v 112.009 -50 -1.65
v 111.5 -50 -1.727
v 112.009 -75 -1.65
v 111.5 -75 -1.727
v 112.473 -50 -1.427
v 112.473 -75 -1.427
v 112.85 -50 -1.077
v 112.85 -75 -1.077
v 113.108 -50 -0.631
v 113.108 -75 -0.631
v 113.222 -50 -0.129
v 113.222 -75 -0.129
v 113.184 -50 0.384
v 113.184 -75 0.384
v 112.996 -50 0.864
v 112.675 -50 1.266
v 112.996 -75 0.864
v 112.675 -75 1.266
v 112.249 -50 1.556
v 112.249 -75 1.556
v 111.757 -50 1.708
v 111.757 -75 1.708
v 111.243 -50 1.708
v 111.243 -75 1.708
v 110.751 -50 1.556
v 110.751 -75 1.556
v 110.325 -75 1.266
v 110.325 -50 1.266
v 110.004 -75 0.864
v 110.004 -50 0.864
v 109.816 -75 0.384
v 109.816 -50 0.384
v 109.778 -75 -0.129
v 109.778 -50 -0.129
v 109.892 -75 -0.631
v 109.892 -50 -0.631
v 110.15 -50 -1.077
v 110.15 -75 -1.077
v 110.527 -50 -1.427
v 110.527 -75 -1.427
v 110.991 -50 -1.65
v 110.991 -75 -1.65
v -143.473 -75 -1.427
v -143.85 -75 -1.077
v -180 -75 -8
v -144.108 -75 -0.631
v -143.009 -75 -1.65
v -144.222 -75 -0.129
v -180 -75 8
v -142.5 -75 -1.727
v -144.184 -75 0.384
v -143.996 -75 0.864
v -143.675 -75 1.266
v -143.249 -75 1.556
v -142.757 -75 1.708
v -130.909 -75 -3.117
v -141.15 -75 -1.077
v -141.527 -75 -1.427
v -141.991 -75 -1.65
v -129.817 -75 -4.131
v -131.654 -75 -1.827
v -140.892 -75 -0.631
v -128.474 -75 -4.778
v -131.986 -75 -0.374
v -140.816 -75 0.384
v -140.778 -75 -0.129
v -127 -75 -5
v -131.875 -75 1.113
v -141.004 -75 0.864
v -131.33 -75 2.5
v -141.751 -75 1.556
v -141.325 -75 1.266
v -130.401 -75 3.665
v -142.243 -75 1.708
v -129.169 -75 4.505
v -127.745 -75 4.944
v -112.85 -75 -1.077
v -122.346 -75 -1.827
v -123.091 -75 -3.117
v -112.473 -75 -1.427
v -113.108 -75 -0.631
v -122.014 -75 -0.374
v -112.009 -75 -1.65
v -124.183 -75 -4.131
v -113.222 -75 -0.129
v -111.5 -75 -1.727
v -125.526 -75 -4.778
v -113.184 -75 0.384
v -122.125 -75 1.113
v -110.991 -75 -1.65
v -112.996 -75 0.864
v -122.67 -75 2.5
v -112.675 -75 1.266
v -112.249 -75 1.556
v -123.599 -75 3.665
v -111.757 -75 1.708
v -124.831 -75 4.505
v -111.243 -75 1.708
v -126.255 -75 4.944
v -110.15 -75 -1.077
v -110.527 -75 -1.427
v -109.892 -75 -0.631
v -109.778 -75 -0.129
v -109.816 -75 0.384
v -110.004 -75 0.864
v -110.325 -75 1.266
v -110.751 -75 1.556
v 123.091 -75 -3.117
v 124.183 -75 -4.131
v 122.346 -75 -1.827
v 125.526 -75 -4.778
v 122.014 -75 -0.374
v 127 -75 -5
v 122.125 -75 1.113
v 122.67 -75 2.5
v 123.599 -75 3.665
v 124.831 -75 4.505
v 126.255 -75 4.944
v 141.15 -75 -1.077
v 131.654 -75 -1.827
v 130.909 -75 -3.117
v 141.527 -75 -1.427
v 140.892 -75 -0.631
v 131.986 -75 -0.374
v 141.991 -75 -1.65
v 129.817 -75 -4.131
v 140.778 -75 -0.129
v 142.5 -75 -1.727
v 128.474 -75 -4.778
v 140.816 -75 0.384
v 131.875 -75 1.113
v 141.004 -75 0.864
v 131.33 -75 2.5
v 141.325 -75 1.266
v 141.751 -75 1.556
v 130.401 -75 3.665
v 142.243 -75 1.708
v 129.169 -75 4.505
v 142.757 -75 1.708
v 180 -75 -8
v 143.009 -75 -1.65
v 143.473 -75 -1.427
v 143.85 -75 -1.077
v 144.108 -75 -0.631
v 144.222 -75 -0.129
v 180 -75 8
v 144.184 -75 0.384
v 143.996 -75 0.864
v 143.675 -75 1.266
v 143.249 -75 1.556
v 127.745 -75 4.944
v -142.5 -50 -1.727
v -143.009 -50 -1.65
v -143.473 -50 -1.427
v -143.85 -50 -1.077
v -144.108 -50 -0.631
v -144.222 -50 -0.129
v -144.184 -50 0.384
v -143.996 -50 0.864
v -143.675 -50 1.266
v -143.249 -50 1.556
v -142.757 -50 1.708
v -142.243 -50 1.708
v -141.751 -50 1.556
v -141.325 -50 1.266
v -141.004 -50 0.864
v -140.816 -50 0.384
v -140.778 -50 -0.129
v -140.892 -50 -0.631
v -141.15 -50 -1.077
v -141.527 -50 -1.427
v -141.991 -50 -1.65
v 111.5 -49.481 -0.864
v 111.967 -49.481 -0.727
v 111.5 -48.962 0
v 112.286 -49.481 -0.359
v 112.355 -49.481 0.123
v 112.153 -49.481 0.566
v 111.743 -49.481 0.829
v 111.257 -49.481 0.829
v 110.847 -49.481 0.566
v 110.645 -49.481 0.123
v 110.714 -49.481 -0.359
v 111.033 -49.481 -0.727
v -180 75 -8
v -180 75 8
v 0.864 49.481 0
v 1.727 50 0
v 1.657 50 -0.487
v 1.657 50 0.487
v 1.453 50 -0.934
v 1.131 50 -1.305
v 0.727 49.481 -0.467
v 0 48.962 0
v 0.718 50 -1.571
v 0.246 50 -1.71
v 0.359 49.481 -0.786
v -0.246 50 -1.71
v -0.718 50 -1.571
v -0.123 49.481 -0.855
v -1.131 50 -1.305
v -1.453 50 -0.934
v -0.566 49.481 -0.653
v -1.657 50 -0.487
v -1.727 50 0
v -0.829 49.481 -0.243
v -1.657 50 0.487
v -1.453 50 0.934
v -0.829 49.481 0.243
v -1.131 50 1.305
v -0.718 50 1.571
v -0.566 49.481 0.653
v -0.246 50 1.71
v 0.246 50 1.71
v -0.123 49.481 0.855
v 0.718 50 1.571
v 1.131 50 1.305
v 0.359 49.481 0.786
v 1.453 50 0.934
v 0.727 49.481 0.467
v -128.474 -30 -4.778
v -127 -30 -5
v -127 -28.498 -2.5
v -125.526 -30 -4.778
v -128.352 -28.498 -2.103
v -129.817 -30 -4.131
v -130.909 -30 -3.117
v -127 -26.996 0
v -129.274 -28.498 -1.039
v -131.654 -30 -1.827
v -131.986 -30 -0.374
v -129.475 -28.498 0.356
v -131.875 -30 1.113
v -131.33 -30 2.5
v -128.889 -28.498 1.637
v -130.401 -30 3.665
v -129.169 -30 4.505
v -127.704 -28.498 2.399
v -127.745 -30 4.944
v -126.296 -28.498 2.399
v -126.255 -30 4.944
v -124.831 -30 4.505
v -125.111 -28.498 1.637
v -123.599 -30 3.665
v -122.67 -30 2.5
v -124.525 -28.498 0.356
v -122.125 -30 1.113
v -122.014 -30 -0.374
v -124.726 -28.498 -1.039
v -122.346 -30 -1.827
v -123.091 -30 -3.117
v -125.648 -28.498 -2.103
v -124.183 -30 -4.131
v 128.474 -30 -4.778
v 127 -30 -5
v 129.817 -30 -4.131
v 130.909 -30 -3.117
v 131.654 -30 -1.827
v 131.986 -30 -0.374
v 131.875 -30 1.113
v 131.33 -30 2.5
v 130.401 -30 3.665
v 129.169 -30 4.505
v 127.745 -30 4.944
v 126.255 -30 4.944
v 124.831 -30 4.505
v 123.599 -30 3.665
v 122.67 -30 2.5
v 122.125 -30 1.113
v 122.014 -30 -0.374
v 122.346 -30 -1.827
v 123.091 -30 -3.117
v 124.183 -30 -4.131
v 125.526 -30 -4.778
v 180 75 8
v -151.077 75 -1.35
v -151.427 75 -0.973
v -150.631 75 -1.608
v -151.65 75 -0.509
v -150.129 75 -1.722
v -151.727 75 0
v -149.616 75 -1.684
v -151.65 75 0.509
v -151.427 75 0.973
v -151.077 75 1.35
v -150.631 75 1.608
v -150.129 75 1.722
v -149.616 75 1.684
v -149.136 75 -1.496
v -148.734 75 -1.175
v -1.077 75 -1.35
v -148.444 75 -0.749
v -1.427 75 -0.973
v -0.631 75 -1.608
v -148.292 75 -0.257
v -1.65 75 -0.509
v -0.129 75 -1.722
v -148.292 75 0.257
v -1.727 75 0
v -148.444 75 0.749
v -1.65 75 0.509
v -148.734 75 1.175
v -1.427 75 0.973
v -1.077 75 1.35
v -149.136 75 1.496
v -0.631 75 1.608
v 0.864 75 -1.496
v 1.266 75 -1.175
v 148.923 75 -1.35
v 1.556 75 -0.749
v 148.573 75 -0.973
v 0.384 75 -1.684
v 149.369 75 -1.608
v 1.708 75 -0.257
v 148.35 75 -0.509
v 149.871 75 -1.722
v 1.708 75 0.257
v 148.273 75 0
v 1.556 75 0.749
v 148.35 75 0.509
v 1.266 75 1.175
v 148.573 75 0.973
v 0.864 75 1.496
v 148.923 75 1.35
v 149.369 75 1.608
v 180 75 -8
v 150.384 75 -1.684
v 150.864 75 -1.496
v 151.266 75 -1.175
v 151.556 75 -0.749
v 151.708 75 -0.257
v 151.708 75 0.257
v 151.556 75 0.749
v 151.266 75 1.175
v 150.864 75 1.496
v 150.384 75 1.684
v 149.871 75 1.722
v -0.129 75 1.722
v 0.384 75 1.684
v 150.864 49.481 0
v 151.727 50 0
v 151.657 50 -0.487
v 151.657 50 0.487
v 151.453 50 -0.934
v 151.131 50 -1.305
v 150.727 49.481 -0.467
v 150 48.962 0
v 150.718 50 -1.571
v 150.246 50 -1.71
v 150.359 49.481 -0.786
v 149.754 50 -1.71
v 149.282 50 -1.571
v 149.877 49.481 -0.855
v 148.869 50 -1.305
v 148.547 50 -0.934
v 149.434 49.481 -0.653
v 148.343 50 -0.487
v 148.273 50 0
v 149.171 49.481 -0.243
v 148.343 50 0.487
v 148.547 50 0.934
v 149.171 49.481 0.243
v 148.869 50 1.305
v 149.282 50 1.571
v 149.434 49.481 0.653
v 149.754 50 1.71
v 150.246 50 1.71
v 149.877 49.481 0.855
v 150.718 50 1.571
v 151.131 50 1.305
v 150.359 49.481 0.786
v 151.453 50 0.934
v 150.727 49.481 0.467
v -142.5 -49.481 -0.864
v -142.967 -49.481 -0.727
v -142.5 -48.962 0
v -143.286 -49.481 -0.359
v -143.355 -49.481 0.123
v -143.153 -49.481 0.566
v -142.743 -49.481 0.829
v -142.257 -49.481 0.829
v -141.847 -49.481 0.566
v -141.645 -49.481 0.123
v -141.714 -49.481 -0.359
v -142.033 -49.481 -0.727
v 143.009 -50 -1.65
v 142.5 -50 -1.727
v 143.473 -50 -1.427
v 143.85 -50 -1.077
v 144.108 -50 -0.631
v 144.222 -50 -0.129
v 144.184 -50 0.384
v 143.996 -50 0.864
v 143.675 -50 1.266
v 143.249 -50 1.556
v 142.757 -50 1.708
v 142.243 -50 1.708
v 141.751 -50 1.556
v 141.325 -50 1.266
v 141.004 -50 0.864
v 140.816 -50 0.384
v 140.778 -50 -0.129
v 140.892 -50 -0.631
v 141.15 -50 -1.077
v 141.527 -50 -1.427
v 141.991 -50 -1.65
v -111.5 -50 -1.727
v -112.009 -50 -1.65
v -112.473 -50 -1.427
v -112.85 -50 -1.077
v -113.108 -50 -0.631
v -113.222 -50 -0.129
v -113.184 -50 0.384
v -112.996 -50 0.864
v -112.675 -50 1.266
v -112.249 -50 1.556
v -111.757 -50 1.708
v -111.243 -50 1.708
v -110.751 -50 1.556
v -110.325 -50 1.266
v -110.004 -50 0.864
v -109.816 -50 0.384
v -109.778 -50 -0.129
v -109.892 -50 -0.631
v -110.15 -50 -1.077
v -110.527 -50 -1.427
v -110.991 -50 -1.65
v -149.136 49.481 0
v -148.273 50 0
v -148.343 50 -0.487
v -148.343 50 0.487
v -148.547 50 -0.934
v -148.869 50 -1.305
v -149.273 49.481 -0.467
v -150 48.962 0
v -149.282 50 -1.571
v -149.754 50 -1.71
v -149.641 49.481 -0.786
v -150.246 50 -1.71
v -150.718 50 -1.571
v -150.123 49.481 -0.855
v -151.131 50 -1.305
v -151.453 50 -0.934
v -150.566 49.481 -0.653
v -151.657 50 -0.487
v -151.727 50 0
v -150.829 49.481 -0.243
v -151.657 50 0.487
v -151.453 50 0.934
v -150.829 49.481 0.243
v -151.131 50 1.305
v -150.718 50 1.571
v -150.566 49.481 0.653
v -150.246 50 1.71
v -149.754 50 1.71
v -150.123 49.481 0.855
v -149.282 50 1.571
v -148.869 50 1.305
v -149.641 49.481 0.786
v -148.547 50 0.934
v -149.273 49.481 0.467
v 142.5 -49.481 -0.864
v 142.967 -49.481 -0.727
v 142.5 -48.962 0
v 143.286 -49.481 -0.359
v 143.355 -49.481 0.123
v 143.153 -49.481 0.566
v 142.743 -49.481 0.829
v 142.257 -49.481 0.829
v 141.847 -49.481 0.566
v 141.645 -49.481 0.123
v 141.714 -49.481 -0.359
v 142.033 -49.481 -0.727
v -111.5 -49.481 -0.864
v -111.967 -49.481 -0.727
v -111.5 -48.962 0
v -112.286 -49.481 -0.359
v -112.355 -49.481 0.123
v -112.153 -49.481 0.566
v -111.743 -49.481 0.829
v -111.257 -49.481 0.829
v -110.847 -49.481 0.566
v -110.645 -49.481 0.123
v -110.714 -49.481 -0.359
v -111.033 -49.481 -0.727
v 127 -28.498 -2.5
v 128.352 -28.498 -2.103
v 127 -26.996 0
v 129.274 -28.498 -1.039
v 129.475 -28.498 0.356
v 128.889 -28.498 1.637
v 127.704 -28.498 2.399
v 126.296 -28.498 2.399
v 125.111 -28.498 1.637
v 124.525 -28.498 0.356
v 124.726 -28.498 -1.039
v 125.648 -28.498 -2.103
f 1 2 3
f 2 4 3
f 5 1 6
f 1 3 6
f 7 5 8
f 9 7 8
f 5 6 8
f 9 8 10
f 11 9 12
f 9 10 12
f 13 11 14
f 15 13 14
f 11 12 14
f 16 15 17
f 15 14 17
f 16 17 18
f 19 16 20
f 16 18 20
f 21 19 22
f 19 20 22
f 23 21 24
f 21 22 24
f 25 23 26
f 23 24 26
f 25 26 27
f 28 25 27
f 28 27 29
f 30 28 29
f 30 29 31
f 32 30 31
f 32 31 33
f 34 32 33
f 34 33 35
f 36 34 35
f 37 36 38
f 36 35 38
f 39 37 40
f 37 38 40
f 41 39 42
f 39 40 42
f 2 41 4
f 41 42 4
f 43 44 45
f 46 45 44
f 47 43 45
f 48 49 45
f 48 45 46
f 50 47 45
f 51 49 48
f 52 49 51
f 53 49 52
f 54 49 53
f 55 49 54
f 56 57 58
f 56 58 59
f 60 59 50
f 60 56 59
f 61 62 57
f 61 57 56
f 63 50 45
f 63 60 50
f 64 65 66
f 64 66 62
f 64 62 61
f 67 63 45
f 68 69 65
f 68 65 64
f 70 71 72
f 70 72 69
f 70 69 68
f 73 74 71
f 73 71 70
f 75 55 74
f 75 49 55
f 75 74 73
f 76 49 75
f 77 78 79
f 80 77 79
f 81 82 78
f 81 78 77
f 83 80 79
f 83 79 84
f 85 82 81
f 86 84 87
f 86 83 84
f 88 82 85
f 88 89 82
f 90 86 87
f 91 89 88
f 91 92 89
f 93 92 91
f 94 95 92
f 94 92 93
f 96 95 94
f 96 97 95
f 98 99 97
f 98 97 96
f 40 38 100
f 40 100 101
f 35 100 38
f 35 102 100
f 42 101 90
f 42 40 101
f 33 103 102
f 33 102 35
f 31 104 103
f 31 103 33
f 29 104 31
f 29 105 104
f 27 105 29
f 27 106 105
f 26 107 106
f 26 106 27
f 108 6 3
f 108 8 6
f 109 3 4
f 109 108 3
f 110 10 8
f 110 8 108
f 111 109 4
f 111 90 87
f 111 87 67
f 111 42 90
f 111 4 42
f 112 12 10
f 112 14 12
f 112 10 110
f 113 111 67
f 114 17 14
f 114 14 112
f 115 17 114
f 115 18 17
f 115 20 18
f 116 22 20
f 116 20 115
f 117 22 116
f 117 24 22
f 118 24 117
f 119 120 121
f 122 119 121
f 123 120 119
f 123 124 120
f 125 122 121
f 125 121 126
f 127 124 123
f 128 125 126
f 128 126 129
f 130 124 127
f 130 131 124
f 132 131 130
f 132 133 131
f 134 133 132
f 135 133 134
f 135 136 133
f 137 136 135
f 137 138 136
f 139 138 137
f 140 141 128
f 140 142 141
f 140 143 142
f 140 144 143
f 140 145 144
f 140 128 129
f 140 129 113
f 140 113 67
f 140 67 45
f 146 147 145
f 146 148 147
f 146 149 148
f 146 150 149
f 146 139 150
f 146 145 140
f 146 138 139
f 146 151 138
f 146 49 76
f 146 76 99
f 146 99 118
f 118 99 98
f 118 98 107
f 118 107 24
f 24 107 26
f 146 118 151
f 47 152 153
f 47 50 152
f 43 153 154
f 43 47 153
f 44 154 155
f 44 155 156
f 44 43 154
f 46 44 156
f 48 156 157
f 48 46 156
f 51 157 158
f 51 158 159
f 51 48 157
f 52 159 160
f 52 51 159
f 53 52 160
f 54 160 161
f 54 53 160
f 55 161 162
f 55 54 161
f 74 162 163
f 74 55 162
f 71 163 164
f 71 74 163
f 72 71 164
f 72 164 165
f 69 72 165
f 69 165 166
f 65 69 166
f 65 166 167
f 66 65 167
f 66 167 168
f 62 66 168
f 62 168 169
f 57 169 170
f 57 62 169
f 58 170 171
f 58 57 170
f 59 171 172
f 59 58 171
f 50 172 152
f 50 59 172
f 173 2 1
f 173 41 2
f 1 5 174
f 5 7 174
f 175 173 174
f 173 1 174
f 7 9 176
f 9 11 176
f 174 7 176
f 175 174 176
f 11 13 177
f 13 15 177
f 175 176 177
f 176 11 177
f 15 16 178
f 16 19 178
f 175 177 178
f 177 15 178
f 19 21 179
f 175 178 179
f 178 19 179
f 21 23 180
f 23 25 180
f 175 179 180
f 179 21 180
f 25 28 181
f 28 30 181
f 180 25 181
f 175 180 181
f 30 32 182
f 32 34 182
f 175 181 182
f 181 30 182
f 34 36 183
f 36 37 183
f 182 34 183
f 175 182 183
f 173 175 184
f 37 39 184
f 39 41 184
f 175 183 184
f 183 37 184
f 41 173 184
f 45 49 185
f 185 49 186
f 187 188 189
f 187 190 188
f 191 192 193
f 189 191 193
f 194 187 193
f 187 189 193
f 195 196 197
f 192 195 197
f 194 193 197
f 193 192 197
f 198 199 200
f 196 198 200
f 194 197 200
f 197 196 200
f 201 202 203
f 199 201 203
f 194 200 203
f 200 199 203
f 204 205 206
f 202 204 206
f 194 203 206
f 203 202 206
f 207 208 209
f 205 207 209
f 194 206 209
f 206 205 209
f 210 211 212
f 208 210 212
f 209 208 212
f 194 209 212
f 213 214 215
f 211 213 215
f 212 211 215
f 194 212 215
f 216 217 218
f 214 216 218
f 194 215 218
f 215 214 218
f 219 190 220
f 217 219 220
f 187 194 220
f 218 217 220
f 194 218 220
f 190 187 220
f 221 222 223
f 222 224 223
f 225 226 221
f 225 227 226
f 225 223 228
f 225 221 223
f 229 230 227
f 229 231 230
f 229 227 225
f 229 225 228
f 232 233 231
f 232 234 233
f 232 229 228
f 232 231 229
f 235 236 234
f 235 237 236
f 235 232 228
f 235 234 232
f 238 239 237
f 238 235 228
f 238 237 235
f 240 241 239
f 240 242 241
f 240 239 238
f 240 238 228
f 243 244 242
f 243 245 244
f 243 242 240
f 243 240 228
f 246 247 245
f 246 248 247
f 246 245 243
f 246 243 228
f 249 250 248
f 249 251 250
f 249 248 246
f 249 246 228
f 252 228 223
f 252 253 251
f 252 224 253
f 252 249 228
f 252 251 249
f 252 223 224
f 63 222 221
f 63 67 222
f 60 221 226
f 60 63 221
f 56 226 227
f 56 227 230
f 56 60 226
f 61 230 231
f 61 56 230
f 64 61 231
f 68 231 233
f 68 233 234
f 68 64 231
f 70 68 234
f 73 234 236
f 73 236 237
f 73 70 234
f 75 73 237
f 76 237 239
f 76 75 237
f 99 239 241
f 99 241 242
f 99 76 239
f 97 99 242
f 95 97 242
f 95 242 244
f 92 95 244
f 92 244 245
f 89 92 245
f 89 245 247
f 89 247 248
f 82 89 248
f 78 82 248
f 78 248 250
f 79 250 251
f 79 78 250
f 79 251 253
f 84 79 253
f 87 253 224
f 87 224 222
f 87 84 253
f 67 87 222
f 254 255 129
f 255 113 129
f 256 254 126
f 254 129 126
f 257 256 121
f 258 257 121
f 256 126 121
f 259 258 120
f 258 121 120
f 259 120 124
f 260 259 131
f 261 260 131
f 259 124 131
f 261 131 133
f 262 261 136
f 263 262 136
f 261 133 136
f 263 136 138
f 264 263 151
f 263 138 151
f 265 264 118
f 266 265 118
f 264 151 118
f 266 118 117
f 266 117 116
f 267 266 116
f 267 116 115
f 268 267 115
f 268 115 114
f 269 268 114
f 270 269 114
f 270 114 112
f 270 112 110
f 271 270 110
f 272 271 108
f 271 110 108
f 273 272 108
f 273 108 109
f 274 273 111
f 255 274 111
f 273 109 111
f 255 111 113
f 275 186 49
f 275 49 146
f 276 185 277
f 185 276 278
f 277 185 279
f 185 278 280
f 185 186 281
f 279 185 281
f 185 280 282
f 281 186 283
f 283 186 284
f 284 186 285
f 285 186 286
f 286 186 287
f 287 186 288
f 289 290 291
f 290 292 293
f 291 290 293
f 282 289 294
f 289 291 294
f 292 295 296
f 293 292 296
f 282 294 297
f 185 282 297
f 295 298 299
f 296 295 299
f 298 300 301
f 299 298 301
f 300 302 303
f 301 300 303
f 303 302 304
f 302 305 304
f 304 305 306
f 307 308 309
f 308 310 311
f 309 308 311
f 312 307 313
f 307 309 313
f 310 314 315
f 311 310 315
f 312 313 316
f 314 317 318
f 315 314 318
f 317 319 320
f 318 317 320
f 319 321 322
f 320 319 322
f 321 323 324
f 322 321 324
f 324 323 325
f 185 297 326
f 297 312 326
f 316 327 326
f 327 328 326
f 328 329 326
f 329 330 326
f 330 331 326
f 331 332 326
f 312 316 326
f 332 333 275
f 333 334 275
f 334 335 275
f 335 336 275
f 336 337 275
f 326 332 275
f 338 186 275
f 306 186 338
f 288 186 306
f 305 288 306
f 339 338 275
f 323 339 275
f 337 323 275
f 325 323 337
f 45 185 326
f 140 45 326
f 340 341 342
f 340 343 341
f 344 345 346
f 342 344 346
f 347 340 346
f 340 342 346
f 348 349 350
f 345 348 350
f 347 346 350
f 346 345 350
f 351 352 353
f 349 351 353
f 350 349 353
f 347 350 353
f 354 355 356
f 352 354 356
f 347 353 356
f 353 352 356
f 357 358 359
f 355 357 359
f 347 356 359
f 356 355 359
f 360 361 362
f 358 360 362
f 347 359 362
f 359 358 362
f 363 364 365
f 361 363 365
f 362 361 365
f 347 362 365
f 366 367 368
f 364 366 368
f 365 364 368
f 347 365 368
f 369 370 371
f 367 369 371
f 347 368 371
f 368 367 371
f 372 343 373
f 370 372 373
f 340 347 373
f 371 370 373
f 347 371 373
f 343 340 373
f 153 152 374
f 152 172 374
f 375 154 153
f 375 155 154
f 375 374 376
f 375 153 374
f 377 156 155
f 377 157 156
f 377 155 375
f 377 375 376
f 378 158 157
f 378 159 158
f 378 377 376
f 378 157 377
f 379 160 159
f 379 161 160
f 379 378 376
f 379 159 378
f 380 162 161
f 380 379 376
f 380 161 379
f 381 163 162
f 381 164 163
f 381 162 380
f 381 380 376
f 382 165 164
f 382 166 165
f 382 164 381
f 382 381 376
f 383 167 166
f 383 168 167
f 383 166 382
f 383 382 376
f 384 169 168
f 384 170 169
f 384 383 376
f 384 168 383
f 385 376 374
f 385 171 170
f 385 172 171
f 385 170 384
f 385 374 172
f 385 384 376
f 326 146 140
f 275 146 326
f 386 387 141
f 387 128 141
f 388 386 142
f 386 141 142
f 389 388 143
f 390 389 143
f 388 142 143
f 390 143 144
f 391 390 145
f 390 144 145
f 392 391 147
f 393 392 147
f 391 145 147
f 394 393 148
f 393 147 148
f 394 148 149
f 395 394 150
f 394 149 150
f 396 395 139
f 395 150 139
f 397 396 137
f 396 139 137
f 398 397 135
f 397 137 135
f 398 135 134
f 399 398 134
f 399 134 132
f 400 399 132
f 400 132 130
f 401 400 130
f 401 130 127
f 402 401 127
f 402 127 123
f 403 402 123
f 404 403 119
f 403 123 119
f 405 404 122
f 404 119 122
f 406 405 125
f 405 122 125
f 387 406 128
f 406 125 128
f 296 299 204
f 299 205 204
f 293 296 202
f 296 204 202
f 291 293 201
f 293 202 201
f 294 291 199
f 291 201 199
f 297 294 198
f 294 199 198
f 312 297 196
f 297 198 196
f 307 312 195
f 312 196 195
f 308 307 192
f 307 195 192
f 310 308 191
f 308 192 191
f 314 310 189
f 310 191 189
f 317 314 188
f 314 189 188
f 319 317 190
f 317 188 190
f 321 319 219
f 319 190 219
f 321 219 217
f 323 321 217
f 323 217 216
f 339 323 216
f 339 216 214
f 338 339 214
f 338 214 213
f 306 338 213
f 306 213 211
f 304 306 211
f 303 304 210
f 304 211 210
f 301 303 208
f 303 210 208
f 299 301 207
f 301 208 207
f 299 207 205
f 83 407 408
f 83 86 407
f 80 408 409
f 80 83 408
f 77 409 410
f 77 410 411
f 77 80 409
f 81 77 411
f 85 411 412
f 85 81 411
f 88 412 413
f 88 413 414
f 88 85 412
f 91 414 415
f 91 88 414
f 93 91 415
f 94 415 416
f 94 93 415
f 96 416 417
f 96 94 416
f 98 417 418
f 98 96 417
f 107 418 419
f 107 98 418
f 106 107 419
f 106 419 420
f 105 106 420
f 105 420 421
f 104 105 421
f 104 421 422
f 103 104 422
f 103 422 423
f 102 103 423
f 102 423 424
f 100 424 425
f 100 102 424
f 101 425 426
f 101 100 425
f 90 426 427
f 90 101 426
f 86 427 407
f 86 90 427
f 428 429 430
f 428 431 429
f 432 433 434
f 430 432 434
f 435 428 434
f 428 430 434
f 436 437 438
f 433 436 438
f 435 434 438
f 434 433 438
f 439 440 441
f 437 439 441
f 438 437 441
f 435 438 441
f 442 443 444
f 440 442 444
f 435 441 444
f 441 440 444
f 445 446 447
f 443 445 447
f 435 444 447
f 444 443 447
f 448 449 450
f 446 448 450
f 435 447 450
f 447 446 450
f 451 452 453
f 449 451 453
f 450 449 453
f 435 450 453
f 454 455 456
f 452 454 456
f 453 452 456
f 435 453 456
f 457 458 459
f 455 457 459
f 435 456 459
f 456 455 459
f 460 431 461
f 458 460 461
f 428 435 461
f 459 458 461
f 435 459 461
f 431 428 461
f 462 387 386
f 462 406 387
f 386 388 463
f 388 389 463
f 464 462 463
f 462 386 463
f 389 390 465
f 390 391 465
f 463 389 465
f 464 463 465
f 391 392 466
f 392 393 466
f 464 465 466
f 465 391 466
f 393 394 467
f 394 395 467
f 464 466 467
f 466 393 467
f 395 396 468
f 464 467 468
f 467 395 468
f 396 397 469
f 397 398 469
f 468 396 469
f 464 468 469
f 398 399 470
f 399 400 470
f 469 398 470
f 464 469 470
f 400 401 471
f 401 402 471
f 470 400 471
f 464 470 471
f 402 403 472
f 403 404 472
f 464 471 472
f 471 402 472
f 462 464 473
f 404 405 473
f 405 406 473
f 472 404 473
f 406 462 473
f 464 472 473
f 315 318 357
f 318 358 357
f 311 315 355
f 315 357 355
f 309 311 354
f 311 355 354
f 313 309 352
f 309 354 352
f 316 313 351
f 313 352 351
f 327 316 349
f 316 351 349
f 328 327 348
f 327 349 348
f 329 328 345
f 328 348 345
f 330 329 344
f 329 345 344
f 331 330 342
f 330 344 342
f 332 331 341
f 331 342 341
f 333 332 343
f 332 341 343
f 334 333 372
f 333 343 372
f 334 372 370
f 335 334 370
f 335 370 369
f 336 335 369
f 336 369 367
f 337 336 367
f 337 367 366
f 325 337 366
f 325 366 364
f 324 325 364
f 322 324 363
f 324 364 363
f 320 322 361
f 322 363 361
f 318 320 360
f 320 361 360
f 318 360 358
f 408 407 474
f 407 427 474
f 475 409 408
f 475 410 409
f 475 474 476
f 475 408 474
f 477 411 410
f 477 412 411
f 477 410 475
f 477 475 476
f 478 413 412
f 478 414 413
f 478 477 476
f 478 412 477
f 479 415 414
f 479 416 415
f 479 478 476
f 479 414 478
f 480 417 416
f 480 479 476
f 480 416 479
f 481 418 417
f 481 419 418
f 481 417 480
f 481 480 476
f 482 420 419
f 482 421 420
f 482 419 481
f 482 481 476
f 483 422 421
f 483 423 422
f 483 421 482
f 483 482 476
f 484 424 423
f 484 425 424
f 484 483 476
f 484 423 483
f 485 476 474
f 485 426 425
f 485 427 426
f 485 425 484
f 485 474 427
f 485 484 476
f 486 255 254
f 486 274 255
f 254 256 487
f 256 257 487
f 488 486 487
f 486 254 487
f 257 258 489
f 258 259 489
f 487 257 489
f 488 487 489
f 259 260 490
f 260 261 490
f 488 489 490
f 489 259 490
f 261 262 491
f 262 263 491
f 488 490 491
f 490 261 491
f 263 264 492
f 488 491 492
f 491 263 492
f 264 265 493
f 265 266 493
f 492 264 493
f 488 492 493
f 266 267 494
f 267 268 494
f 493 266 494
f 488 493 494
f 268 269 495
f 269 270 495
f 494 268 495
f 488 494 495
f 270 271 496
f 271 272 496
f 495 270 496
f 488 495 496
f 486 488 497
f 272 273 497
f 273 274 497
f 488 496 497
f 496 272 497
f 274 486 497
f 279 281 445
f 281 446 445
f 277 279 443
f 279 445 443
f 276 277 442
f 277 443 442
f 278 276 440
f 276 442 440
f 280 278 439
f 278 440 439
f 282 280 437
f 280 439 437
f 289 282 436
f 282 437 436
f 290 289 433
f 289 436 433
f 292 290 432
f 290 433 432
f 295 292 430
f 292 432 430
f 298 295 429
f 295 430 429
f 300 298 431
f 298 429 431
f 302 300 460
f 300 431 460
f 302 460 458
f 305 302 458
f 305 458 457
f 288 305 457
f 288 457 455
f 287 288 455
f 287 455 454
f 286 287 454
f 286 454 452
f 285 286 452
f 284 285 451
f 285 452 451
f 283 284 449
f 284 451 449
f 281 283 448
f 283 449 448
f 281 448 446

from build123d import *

# Parameters (mm, degrees)
SKETCH1_W                      = 360
SKETCH1_H                      = 150
BOSS_EXTRUDE1_DEPTH            = 8
F_8_36_TAPPED_HOLE1_AT_2_COUNT = 2
F_8_36_TAPPED_HOLE1_AT_2_PITCH = 31
F_8_36_TAPPED_HOLE2_D          = 3.4544
F_8_36_TAPPED_HOLE2_DEPTH      = 25
F_8_36_TAPPED_HOLE2_TIP        = 1.037806461


with BuildPart() as part:
    # Sketch1 → Boss-Extrude1 (new, symmetric)
    with BuildSketch(Plane.XY):
        Rectangle(SKETCH1_W, SKETCH1_H)
    extrude(amount=BOSS_EXTRUDE1_DEPTH, both=True)

    # Sketch3 → #8-36 Tapped Hole1 (revolve, cut)
    with BuildSketch(Plane(origin=(-142.5, -75, 0), x_dir=(0, 0, -1), z_dir=(1, 0, 0))):
        Polygon((0, 0), (0, 26.037806461), (1.7272, 25), (1.7272, 0), align=None)
    f_8_36_tapped_hole1 = revolve(axis=Axis((-142.5, -81.35, 0), (0, 1, 0)), mode=Mode.SUBTRACT)

    # #8-36 Tapped Hole1 at 2: #8-36 Tapped Hole1 ×2
    with Locations(*[(i * F_8_36_TAPPED_HOLE1_AT_2_PITCH, 0, 0) for i in range(1, F_8_36_TAPPED_HOLE1_AT_2_COUNT)]):
        add(f_8_36_tapped_hole1, mode=Mode.SUBTRACT)

    # Sketch6 → M8 Clearance Hole1 (revolve, cut)
    with BuildSketch(Plane(origin=(-127, -75, 0), x_dir=(0, 0, -1), z_dir=(1, 0, 0))):
        Polygon((0, 0), (0, 48.004303095), (5, 45), (5, 0), align=None)
    m8_clearance_hole1 = revolve(axis=Axis((-127, -81.35, 0), (0, 1, 0)), mode=Mode.SUBTRACT)

    # Mirror1: #8-36 Tapped Hole1, M8 Clearance Hole1 across plane
    add(f_8_36_tapped_hole1.mirror(Plane(origin=(0, 0, 0), x_dir=(0, 0, 1), z_dir=(1, 0, 0))), mode=Mode.SUBTRACT)
    add(m8_clearance_hole1.mirror(Plane(origin=(0, 0, 0), x_dir=(0, 0, 1), z_dir=(1, 0, 0))), mode=Mode.SUBTRACT)

    # Mirror1 copy 1 sketch → Mirror1 copy 1 (revolve, cut)
    with BuildSketch(Plane(origin=(111.5, -75, 0), x_dir=(0, 0, -1), z_dir=(-1, 0, 0))):
        Polygon((0, 0), (0, -26.037806461), (1.7272, -25), (1.7272, 0), align=None)
    revolve(axis=Axis((111.5, -81.35, 0), (0, -1, 0)), mode=Mode.SUBTRACT)

    # #8-36 Tapped Hole2
    with Locations(Plane(origin=(597.704940286, 75, -222), x_dir=(1, 0, 0), z_dir=(0, 1, 0))):
        with Locations((-447.704940286, -222), (-597.704940286, -222), (-747.704940286, -222)):
            Hole(F_8_36_TAPPED_HOLE2_D / 2, depth=F_8_36_TAPPED_HOLE2_DEPTH)
            with Locations((0, 0, -(F_8_36_TAPPED_HOLE2_DEPTH + F_8_36_TAPPED_HOLE2_TIP / 2))):  # 118° drill point
                Cone(0, F_8_36_TAPPED_HOLE2_D / 2, F_8_36_TAPPED_HOLE2_TIP, mode=Mode.SUBTRACT)


solid = part.part
